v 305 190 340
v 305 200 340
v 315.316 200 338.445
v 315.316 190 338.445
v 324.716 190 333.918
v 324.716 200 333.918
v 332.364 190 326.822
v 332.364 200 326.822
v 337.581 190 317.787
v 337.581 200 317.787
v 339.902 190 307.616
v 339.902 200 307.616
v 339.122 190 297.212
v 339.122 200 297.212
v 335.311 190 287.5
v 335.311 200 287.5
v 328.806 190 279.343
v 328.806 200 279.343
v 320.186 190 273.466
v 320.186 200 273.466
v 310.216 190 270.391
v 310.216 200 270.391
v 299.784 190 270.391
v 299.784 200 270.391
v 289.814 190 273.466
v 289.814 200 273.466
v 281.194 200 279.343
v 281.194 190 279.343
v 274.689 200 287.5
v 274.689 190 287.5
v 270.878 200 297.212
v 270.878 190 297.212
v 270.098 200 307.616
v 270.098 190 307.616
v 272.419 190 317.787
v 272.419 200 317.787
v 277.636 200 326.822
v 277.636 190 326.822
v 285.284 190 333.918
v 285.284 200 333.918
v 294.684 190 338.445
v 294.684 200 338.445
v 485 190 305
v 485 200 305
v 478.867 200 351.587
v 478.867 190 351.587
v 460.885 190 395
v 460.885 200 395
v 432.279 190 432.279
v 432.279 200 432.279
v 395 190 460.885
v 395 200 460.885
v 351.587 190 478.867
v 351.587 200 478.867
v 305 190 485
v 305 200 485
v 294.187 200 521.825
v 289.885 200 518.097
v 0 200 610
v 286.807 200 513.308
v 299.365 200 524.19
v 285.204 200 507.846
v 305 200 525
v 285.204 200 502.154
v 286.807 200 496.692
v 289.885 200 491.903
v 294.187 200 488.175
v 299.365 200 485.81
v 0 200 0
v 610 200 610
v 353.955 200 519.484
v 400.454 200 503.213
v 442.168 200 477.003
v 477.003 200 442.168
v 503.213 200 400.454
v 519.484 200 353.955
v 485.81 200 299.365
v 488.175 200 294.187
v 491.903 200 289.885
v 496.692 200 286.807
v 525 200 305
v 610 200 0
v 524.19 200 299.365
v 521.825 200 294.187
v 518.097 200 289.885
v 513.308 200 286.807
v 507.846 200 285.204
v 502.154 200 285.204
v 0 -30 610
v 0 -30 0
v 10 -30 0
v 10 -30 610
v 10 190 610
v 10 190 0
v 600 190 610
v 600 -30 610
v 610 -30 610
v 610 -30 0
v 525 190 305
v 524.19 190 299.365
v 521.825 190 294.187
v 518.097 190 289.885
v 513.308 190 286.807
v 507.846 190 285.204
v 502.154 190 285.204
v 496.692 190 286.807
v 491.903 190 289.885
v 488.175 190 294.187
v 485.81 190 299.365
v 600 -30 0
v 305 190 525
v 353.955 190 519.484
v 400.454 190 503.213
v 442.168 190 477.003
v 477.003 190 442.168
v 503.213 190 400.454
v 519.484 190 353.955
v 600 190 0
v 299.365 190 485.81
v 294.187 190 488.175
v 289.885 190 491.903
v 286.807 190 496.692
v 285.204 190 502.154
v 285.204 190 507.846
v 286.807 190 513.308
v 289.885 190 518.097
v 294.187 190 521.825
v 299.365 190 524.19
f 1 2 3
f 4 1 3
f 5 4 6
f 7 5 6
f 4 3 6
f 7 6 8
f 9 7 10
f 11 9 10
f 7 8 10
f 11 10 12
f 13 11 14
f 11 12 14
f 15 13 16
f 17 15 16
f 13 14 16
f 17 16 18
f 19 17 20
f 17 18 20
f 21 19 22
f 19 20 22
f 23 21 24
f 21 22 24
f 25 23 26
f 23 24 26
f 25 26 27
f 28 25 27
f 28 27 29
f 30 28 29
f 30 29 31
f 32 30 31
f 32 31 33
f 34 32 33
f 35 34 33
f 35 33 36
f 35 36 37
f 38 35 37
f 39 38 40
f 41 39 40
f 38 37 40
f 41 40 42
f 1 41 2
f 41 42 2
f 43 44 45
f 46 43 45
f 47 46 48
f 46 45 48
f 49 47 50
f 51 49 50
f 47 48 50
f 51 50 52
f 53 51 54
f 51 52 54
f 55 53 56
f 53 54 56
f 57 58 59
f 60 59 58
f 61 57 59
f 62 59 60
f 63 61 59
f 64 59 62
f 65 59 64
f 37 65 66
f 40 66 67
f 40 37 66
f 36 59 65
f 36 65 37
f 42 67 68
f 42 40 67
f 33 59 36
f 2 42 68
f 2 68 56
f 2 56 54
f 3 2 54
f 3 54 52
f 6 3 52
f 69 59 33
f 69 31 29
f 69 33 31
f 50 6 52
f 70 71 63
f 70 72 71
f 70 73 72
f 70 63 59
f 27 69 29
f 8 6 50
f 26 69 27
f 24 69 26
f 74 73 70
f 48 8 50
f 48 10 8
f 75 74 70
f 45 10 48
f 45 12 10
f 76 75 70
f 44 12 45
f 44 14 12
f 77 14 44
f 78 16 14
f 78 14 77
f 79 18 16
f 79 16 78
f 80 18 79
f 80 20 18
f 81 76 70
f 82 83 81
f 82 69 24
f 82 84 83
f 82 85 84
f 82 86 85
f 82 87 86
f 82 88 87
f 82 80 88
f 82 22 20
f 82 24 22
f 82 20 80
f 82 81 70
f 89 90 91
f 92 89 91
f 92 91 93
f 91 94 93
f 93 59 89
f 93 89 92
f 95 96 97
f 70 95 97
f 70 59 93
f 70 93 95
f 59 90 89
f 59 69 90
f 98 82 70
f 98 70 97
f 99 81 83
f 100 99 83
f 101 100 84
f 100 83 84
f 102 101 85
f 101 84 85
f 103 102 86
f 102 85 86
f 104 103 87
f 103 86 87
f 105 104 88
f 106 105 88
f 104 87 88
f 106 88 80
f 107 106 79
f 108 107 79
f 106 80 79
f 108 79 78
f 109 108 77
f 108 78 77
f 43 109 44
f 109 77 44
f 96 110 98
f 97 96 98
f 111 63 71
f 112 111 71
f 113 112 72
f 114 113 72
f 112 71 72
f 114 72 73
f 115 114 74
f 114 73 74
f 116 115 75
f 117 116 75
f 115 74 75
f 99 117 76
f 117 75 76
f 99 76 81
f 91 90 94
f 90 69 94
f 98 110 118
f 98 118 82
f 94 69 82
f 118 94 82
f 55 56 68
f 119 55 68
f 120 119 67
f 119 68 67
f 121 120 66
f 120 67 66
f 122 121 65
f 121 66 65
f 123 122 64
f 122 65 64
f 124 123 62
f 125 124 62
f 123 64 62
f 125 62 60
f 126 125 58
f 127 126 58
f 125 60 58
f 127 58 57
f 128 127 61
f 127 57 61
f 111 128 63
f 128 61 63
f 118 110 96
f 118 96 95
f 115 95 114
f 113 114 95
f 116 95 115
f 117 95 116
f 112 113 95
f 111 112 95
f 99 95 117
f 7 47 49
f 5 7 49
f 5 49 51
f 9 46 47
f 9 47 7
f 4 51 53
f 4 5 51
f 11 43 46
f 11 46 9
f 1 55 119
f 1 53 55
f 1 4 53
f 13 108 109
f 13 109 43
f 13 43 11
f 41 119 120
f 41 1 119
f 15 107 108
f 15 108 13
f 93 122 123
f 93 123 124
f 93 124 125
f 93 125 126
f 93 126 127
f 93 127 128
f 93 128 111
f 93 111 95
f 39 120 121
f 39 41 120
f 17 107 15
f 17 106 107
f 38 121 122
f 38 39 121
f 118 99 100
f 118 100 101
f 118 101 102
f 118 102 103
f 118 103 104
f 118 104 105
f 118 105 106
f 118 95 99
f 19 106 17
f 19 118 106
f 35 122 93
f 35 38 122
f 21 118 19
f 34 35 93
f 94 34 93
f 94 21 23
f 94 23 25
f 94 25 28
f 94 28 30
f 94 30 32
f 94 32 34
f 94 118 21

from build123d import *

# Parameters (mm, degrees)
Y_KSEKLIK_EKSTR_ZYON1_DEPTH = 610
IZIM3_W                     = 10
IZIM3_H                     = 610
Y_KSEKLIK_EKSTR_ZYON2_DEPTH = 30
IZIM2_R                     = 35
KES_EKSTR_ZYON1_DEPTH       = 10


with BuildPart() as part:
    # Çizim1 → Yükseklik-Ekstrüzyon1 (new body)
    with BuildSketch(Plane.XY):
        Polygon((0, 0), (0, 200), (610, 200), (610, 0), (600, 0), (600, 190), (10, 190), (10, 0), align=None)
    extrude(amount=Y_KSEKLIK_EKSTR_ZYON1_DEPTH)

    # Çizim3 → Yükseklik-Ekstrüzyon2 (add)
    with BuildSketch(Plane.XZ):
        with Locations((5, 305)):
            Rectangle(IZIM3_W, IZIM3_H)
        with Locations((605, 305)):
            Rectangle(IZIM3_W, IZIM3_H)
    extrude(amount=Y_KSEKLIK_EKSTR_ZYON2_DEPTH)

    # Çizim2 → Kes-Ekstrüzyon1 (cut)
    with BuildSketch(Plane(origin=(0, 200, 0), x_dir=(1, 0, 0), z_dir=(0, 1, 0))):
        with Locations(Location((305, -305, 0), (0, 0, 270))):
            Circle(IZIM2_R)
        with BuildLine():
            ThreePointArc((305, -525), (460.563491861, -460.563491861), (525, -305))
            ThreePointArc((525, -305), (505, -285), (485, -305))
            ThreePointArc((485, -305), (432.279220614, -432.279220614), (305, -485))
            ThreePointArc((305, -485), (285, -505), (305, -525))
        make_face()
    extrude(amount=-KES_EKSTR_ZYON1_DEPTH, mode=Mode.SUBTRACT)


solid = part.part
